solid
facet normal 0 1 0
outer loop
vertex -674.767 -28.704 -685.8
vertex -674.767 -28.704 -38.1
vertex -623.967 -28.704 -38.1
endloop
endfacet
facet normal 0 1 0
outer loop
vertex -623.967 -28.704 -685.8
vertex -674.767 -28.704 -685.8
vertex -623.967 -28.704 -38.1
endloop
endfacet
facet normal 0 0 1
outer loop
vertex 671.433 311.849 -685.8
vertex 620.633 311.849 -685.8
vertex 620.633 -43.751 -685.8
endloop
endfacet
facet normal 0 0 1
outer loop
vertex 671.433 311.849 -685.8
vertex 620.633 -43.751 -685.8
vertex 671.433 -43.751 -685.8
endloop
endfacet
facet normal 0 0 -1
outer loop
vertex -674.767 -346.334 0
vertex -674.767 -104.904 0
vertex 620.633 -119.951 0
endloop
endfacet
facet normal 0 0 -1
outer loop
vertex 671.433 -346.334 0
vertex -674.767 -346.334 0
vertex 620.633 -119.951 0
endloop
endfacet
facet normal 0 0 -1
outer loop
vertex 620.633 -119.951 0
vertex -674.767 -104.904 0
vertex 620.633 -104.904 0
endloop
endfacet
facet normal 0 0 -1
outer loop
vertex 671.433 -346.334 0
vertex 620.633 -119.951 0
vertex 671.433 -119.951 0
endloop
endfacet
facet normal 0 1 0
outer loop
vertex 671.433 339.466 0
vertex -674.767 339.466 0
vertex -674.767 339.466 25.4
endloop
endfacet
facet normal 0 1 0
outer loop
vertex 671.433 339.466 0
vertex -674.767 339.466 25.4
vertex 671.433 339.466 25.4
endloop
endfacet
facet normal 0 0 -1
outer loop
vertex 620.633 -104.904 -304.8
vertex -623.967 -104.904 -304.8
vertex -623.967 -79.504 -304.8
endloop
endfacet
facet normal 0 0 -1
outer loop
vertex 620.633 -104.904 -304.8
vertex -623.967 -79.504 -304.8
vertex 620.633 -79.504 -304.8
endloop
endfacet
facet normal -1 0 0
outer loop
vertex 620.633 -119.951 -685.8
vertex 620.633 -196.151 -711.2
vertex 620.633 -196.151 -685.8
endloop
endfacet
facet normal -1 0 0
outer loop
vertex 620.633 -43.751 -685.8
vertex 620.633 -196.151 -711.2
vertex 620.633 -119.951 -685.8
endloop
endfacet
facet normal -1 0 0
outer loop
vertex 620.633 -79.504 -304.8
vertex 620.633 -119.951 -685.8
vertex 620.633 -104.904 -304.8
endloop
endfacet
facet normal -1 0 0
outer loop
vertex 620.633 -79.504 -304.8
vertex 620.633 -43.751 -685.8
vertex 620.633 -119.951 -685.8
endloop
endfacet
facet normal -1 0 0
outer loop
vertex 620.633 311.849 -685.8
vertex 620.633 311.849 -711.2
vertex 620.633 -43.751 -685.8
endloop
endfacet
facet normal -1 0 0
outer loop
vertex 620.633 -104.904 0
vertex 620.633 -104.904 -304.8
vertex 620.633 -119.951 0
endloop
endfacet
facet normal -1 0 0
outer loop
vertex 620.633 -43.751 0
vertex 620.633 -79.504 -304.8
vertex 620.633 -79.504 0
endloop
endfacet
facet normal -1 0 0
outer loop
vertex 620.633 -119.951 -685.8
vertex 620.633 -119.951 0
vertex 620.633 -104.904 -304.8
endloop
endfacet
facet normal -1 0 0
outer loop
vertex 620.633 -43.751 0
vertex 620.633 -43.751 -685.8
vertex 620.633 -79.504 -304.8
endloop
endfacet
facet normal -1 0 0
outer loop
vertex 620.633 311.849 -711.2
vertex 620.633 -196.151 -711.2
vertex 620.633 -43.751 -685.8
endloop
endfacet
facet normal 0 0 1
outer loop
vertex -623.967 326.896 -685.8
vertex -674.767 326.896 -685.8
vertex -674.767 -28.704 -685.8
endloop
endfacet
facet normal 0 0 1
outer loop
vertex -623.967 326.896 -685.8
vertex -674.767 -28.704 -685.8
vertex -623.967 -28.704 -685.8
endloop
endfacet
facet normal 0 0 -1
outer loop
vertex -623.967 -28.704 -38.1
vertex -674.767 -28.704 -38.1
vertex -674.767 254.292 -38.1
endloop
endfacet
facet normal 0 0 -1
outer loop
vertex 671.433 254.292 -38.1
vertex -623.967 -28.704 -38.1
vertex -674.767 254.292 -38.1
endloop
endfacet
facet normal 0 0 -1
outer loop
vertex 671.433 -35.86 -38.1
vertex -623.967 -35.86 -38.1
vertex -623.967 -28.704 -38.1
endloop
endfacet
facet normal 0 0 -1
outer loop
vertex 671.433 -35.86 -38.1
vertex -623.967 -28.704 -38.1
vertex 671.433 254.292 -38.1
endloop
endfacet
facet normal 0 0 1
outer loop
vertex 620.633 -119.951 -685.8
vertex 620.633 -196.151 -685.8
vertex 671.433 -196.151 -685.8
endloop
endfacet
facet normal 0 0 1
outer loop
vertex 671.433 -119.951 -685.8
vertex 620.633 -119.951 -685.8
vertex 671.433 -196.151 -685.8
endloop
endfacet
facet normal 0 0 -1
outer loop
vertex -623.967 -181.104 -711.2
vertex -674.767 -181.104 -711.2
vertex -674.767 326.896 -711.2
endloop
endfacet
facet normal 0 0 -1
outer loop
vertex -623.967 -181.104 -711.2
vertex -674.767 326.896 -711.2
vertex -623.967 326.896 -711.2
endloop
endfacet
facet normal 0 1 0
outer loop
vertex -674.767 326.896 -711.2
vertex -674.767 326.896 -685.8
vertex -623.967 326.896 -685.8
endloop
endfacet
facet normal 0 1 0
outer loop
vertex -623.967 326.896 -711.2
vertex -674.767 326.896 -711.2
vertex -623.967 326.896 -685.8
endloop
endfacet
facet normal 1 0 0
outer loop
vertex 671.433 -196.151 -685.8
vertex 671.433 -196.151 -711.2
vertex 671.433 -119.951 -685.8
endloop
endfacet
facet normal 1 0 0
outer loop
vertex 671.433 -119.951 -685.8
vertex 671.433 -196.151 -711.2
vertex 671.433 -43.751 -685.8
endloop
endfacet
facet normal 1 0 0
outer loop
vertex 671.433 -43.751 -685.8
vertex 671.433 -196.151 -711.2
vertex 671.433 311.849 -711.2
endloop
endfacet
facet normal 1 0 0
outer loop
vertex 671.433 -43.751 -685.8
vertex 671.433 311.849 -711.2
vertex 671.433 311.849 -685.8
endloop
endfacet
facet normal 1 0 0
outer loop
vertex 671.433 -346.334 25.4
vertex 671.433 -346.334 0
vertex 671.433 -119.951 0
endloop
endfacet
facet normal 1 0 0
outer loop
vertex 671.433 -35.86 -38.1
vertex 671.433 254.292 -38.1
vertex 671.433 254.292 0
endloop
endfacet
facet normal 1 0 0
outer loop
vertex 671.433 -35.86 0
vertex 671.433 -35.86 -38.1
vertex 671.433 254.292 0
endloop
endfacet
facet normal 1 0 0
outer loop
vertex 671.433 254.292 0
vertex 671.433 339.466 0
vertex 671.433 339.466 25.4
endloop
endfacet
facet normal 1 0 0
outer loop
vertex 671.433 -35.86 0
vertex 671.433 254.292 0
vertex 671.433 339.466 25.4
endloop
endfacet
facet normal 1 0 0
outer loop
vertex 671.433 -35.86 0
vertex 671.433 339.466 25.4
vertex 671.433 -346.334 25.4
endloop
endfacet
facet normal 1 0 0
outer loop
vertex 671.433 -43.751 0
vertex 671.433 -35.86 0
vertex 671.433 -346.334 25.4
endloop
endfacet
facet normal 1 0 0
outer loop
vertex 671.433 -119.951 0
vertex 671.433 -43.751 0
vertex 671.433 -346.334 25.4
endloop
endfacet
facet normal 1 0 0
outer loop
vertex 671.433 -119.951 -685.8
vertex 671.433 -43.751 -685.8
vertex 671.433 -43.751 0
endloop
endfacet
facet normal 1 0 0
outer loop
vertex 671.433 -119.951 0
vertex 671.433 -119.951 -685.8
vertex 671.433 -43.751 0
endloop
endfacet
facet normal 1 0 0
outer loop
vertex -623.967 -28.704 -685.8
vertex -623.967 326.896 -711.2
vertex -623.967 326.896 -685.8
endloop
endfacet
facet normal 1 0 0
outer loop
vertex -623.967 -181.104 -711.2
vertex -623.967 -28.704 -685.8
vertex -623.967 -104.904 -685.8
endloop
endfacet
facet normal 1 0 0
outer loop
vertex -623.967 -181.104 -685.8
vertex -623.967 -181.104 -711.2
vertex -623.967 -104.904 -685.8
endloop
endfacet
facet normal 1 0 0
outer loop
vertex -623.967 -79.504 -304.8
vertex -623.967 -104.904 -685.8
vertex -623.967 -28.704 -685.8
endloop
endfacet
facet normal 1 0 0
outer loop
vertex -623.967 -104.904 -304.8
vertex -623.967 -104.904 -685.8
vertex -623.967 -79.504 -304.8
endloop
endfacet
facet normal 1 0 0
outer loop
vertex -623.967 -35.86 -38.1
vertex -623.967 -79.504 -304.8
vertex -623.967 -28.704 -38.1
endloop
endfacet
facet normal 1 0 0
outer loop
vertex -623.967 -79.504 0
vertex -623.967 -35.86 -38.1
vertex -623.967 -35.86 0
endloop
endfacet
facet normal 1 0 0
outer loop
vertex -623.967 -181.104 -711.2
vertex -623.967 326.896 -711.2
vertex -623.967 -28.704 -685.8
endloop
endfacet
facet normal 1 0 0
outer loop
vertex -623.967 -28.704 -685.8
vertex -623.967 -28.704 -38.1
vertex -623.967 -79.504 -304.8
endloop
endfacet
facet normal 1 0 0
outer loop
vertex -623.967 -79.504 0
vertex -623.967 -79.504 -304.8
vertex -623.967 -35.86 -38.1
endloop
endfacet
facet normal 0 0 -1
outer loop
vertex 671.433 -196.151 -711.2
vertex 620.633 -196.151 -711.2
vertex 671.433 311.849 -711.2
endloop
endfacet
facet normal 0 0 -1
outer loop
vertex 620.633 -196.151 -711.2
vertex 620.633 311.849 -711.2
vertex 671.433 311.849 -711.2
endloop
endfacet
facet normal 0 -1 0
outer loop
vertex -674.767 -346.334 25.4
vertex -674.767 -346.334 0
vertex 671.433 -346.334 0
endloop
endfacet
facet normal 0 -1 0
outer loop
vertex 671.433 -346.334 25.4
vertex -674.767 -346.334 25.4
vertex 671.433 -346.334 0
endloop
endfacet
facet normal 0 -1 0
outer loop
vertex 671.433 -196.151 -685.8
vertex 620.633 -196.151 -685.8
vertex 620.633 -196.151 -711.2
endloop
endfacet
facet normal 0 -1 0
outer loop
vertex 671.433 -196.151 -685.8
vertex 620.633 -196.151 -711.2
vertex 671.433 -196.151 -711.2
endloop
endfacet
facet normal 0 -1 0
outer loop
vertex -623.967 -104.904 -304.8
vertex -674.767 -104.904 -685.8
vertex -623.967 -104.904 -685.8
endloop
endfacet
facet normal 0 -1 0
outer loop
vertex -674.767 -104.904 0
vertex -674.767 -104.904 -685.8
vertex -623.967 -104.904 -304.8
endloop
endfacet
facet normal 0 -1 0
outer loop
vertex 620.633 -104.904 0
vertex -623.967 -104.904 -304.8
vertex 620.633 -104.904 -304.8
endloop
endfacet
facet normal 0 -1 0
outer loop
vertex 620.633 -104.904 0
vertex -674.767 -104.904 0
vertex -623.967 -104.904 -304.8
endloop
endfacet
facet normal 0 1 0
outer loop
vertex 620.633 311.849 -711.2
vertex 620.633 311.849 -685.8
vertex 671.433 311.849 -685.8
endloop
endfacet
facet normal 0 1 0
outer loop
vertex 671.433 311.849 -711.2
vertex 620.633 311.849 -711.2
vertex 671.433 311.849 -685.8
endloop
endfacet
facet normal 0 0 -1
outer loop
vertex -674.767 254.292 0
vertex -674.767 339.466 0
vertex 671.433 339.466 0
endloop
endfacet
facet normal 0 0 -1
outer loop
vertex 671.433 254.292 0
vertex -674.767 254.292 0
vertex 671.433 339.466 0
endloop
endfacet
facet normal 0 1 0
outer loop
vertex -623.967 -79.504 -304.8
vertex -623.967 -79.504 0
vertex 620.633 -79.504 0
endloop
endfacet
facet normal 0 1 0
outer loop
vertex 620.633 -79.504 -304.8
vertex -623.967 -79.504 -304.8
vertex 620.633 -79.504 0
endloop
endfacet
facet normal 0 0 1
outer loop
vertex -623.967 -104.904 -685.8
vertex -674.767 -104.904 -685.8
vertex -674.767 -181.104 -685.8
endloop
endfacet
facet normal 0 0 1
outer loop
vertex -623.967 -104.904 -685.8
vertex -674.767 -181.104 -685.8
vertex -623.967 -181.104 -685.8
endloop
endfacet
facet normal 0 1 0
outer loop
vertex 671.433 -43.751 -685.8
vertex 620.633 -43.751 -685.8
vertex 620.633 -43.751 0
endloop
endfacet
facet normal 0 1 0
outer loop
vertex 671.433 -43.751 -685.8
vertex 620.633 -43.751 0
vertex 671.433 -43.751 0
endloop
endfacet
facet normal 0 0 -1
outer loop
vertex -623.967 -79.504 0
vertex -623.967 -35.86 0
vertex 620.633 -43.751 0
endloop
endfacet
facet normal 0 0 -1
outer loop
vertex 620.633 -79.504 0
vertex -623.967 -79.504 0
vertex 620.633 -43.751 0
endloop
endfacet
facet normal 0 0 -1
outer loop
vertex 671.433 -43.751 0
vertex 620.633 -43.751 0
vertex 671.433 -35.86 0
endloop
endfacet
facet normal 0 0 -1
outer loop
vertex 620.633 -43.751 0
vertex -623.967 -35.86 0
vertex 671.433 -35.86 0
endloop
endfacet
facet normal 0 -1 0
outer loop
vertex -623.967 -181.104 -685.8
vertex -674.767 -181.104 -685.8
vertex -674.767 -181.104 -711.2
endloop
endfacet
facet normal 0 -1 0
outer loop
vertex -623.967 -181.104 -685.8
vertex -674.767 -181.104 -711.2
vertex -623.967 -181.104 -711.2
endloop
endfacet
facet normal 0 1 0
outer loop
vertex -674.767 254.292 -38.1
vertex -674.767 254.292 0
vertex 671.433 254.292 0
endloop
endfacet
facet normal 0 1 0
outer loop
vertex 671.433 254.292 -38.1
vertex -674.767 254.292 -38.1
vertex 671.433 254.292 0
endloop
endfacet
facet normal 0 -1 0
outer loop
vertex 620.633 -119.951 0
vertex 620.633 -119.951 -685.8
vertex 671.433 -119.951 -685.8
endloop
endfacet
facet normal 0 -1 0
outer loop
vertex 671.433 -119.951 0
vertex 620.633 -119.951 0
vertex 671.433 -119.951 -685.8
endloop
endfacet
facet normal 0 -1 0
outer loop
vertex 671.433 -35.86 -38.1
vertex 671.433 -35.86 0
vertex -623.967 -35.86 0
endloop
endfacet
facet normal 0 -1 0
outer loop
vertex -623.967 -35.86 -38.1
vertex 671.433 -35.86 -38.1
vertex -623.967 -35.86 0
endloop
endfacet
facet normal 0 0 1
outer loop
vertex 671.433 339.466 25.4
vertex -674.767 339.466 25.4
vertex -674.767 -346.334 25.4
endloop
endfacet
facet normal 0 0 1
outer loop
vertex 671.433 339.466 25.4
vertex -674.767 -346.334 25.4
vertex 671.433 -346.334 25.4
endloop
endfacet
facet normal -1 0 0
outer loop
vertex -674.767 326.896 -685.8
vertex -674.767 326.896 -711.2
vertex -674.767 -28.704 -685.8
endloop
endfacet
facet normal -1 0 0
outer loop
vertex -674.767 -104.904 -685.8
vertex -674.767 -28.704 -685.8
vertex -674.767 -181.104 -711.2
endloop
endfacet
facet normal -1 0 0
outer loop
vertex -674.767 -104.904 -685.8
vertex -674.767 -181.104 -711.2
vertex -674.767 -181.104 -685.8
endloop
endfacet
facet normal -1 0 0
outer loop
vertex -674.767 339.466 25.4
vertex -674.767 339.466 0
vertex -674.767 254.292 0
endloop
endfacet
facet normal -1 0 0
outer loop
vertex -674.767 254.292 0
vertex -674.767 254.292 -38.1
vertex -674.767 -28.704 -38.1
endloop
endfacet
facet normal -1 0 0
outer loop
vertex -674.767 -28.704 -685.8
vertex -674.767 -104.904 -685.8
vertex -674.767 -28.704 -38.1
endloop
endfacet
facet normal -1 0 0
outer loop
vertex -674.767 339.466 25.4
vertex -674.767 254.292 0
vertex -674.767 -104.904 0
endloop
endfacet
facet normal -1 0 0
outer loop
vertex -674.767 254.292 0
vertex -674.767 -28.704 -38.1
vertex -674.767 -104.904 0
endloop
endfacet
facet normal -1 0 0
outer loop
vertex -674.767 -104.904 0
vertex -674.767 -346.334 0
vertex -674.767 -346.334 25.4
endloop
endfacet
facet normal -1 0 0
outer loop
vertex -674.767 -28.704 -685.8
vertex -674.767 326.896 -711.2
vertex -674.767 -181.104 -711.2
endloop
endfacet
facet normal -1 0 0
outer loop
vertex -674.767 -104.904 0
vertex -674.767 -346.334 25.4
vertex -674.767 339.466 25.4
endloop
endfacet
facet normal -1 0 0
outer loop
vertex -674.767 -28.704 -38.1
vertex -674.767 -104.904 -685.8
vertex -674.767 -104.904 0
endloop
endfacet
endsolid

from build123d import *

# Parameters (mm, degrees)
F0_W           = 1346.2
F0_H           = 685.8
F1_DEPTH       = 25.4
F4_DEPTH       = 38.1
F2_W           = 50.8
F2_H           = 76.2
F5_DEPTH       = 685.8
F7_W           = 50.8
F7_H           = 25.4
F8_DEPTH       = 76.2
F8_DEPTH_BACK  = 431.8
F9_W           = 1244.6
F9_H           = 304.8
F10_DEPTH      = 25.4
F6_W           = 50.8
F6_H           = 25.4
F11_DEPTH      = 431.8
F11_DEPTH_BACK = 76.2


with BuildPart() as f1:
    # F0 (on Top) → F1 (new body)
    with BuildSketch(Plane.XY):
        with Locations((-1.6667507589, -3.4339692544)):
            Rectangle(F0_W, F0_H)
    extrude(amount=F1_DEPTH)

    # F3 (on face) → F4 (join)
    with BuildSketch(Plane(origin=(0, 0, 0), x_dir=(1, 0, 0), z_dir=(0, 0, -1))):
        Polygon((-674.7667507589, -254.2923092842), (671.4332492411, -254.2923092842), (671.4332492411, 35.8601883054), (-623.9667507589, 35.8601883054), (-623.9667507589, 28.7036430091), (-674.7667507589, 28.7036430091), align=None)
    extrude(amount=F4_DEPTH)

    # F2 (on face) → F5 (join)
    with BuildSketch(Plane(origin=(0, 0, 0), x_dir=(1, 0, 0), z_dir=(0, 0, -1))):
        with Locations((646.0332492411, 81.8509380281)):
            Rectangle(F2_W, F2_H)
        with Locations((-649.3667507589, 66.8036430091)):
            Rectangle(F2_W, F2_H)
    extrude(amount=F5_DEPTH)

    # F7 (on face) → F8 (join, two sides)
    with BuildSketch(Plane.XZ.offset(104.9036430091)) as f8_sk:
        with Locations((-649.3667507589, -698.5)):
            Rectangle(F7_W, F7_H)
    extrude(amount=F8_DEPTH)
    extrude(f8_sk.sketch, amount=-F8_DEPTH_BACK)

    # F9 (on face) → F10 (join)
    with BuildSketch(Plane.XZ.offset(104.9036430091)):
        with Locations((-1.6667507589, -152.4)):
            Rectangle(F9_W, F9_H)
    extrude(amount=-F10_DEPTH)

    # F6 (on face) → F11 (join, two sides)
    with BuildSketch(Plane.XZ.offset(119.9509380281)) as f11_sk:
        with Locations((646.0332492411, -698.5)):
            Rectangle(F6_W, F6_H)
    extrude(amount=-F11_DEPTH)
    extrude(f11_sk.sketch, amount=F11_DEPTH_BACK)


solid = f1.part
